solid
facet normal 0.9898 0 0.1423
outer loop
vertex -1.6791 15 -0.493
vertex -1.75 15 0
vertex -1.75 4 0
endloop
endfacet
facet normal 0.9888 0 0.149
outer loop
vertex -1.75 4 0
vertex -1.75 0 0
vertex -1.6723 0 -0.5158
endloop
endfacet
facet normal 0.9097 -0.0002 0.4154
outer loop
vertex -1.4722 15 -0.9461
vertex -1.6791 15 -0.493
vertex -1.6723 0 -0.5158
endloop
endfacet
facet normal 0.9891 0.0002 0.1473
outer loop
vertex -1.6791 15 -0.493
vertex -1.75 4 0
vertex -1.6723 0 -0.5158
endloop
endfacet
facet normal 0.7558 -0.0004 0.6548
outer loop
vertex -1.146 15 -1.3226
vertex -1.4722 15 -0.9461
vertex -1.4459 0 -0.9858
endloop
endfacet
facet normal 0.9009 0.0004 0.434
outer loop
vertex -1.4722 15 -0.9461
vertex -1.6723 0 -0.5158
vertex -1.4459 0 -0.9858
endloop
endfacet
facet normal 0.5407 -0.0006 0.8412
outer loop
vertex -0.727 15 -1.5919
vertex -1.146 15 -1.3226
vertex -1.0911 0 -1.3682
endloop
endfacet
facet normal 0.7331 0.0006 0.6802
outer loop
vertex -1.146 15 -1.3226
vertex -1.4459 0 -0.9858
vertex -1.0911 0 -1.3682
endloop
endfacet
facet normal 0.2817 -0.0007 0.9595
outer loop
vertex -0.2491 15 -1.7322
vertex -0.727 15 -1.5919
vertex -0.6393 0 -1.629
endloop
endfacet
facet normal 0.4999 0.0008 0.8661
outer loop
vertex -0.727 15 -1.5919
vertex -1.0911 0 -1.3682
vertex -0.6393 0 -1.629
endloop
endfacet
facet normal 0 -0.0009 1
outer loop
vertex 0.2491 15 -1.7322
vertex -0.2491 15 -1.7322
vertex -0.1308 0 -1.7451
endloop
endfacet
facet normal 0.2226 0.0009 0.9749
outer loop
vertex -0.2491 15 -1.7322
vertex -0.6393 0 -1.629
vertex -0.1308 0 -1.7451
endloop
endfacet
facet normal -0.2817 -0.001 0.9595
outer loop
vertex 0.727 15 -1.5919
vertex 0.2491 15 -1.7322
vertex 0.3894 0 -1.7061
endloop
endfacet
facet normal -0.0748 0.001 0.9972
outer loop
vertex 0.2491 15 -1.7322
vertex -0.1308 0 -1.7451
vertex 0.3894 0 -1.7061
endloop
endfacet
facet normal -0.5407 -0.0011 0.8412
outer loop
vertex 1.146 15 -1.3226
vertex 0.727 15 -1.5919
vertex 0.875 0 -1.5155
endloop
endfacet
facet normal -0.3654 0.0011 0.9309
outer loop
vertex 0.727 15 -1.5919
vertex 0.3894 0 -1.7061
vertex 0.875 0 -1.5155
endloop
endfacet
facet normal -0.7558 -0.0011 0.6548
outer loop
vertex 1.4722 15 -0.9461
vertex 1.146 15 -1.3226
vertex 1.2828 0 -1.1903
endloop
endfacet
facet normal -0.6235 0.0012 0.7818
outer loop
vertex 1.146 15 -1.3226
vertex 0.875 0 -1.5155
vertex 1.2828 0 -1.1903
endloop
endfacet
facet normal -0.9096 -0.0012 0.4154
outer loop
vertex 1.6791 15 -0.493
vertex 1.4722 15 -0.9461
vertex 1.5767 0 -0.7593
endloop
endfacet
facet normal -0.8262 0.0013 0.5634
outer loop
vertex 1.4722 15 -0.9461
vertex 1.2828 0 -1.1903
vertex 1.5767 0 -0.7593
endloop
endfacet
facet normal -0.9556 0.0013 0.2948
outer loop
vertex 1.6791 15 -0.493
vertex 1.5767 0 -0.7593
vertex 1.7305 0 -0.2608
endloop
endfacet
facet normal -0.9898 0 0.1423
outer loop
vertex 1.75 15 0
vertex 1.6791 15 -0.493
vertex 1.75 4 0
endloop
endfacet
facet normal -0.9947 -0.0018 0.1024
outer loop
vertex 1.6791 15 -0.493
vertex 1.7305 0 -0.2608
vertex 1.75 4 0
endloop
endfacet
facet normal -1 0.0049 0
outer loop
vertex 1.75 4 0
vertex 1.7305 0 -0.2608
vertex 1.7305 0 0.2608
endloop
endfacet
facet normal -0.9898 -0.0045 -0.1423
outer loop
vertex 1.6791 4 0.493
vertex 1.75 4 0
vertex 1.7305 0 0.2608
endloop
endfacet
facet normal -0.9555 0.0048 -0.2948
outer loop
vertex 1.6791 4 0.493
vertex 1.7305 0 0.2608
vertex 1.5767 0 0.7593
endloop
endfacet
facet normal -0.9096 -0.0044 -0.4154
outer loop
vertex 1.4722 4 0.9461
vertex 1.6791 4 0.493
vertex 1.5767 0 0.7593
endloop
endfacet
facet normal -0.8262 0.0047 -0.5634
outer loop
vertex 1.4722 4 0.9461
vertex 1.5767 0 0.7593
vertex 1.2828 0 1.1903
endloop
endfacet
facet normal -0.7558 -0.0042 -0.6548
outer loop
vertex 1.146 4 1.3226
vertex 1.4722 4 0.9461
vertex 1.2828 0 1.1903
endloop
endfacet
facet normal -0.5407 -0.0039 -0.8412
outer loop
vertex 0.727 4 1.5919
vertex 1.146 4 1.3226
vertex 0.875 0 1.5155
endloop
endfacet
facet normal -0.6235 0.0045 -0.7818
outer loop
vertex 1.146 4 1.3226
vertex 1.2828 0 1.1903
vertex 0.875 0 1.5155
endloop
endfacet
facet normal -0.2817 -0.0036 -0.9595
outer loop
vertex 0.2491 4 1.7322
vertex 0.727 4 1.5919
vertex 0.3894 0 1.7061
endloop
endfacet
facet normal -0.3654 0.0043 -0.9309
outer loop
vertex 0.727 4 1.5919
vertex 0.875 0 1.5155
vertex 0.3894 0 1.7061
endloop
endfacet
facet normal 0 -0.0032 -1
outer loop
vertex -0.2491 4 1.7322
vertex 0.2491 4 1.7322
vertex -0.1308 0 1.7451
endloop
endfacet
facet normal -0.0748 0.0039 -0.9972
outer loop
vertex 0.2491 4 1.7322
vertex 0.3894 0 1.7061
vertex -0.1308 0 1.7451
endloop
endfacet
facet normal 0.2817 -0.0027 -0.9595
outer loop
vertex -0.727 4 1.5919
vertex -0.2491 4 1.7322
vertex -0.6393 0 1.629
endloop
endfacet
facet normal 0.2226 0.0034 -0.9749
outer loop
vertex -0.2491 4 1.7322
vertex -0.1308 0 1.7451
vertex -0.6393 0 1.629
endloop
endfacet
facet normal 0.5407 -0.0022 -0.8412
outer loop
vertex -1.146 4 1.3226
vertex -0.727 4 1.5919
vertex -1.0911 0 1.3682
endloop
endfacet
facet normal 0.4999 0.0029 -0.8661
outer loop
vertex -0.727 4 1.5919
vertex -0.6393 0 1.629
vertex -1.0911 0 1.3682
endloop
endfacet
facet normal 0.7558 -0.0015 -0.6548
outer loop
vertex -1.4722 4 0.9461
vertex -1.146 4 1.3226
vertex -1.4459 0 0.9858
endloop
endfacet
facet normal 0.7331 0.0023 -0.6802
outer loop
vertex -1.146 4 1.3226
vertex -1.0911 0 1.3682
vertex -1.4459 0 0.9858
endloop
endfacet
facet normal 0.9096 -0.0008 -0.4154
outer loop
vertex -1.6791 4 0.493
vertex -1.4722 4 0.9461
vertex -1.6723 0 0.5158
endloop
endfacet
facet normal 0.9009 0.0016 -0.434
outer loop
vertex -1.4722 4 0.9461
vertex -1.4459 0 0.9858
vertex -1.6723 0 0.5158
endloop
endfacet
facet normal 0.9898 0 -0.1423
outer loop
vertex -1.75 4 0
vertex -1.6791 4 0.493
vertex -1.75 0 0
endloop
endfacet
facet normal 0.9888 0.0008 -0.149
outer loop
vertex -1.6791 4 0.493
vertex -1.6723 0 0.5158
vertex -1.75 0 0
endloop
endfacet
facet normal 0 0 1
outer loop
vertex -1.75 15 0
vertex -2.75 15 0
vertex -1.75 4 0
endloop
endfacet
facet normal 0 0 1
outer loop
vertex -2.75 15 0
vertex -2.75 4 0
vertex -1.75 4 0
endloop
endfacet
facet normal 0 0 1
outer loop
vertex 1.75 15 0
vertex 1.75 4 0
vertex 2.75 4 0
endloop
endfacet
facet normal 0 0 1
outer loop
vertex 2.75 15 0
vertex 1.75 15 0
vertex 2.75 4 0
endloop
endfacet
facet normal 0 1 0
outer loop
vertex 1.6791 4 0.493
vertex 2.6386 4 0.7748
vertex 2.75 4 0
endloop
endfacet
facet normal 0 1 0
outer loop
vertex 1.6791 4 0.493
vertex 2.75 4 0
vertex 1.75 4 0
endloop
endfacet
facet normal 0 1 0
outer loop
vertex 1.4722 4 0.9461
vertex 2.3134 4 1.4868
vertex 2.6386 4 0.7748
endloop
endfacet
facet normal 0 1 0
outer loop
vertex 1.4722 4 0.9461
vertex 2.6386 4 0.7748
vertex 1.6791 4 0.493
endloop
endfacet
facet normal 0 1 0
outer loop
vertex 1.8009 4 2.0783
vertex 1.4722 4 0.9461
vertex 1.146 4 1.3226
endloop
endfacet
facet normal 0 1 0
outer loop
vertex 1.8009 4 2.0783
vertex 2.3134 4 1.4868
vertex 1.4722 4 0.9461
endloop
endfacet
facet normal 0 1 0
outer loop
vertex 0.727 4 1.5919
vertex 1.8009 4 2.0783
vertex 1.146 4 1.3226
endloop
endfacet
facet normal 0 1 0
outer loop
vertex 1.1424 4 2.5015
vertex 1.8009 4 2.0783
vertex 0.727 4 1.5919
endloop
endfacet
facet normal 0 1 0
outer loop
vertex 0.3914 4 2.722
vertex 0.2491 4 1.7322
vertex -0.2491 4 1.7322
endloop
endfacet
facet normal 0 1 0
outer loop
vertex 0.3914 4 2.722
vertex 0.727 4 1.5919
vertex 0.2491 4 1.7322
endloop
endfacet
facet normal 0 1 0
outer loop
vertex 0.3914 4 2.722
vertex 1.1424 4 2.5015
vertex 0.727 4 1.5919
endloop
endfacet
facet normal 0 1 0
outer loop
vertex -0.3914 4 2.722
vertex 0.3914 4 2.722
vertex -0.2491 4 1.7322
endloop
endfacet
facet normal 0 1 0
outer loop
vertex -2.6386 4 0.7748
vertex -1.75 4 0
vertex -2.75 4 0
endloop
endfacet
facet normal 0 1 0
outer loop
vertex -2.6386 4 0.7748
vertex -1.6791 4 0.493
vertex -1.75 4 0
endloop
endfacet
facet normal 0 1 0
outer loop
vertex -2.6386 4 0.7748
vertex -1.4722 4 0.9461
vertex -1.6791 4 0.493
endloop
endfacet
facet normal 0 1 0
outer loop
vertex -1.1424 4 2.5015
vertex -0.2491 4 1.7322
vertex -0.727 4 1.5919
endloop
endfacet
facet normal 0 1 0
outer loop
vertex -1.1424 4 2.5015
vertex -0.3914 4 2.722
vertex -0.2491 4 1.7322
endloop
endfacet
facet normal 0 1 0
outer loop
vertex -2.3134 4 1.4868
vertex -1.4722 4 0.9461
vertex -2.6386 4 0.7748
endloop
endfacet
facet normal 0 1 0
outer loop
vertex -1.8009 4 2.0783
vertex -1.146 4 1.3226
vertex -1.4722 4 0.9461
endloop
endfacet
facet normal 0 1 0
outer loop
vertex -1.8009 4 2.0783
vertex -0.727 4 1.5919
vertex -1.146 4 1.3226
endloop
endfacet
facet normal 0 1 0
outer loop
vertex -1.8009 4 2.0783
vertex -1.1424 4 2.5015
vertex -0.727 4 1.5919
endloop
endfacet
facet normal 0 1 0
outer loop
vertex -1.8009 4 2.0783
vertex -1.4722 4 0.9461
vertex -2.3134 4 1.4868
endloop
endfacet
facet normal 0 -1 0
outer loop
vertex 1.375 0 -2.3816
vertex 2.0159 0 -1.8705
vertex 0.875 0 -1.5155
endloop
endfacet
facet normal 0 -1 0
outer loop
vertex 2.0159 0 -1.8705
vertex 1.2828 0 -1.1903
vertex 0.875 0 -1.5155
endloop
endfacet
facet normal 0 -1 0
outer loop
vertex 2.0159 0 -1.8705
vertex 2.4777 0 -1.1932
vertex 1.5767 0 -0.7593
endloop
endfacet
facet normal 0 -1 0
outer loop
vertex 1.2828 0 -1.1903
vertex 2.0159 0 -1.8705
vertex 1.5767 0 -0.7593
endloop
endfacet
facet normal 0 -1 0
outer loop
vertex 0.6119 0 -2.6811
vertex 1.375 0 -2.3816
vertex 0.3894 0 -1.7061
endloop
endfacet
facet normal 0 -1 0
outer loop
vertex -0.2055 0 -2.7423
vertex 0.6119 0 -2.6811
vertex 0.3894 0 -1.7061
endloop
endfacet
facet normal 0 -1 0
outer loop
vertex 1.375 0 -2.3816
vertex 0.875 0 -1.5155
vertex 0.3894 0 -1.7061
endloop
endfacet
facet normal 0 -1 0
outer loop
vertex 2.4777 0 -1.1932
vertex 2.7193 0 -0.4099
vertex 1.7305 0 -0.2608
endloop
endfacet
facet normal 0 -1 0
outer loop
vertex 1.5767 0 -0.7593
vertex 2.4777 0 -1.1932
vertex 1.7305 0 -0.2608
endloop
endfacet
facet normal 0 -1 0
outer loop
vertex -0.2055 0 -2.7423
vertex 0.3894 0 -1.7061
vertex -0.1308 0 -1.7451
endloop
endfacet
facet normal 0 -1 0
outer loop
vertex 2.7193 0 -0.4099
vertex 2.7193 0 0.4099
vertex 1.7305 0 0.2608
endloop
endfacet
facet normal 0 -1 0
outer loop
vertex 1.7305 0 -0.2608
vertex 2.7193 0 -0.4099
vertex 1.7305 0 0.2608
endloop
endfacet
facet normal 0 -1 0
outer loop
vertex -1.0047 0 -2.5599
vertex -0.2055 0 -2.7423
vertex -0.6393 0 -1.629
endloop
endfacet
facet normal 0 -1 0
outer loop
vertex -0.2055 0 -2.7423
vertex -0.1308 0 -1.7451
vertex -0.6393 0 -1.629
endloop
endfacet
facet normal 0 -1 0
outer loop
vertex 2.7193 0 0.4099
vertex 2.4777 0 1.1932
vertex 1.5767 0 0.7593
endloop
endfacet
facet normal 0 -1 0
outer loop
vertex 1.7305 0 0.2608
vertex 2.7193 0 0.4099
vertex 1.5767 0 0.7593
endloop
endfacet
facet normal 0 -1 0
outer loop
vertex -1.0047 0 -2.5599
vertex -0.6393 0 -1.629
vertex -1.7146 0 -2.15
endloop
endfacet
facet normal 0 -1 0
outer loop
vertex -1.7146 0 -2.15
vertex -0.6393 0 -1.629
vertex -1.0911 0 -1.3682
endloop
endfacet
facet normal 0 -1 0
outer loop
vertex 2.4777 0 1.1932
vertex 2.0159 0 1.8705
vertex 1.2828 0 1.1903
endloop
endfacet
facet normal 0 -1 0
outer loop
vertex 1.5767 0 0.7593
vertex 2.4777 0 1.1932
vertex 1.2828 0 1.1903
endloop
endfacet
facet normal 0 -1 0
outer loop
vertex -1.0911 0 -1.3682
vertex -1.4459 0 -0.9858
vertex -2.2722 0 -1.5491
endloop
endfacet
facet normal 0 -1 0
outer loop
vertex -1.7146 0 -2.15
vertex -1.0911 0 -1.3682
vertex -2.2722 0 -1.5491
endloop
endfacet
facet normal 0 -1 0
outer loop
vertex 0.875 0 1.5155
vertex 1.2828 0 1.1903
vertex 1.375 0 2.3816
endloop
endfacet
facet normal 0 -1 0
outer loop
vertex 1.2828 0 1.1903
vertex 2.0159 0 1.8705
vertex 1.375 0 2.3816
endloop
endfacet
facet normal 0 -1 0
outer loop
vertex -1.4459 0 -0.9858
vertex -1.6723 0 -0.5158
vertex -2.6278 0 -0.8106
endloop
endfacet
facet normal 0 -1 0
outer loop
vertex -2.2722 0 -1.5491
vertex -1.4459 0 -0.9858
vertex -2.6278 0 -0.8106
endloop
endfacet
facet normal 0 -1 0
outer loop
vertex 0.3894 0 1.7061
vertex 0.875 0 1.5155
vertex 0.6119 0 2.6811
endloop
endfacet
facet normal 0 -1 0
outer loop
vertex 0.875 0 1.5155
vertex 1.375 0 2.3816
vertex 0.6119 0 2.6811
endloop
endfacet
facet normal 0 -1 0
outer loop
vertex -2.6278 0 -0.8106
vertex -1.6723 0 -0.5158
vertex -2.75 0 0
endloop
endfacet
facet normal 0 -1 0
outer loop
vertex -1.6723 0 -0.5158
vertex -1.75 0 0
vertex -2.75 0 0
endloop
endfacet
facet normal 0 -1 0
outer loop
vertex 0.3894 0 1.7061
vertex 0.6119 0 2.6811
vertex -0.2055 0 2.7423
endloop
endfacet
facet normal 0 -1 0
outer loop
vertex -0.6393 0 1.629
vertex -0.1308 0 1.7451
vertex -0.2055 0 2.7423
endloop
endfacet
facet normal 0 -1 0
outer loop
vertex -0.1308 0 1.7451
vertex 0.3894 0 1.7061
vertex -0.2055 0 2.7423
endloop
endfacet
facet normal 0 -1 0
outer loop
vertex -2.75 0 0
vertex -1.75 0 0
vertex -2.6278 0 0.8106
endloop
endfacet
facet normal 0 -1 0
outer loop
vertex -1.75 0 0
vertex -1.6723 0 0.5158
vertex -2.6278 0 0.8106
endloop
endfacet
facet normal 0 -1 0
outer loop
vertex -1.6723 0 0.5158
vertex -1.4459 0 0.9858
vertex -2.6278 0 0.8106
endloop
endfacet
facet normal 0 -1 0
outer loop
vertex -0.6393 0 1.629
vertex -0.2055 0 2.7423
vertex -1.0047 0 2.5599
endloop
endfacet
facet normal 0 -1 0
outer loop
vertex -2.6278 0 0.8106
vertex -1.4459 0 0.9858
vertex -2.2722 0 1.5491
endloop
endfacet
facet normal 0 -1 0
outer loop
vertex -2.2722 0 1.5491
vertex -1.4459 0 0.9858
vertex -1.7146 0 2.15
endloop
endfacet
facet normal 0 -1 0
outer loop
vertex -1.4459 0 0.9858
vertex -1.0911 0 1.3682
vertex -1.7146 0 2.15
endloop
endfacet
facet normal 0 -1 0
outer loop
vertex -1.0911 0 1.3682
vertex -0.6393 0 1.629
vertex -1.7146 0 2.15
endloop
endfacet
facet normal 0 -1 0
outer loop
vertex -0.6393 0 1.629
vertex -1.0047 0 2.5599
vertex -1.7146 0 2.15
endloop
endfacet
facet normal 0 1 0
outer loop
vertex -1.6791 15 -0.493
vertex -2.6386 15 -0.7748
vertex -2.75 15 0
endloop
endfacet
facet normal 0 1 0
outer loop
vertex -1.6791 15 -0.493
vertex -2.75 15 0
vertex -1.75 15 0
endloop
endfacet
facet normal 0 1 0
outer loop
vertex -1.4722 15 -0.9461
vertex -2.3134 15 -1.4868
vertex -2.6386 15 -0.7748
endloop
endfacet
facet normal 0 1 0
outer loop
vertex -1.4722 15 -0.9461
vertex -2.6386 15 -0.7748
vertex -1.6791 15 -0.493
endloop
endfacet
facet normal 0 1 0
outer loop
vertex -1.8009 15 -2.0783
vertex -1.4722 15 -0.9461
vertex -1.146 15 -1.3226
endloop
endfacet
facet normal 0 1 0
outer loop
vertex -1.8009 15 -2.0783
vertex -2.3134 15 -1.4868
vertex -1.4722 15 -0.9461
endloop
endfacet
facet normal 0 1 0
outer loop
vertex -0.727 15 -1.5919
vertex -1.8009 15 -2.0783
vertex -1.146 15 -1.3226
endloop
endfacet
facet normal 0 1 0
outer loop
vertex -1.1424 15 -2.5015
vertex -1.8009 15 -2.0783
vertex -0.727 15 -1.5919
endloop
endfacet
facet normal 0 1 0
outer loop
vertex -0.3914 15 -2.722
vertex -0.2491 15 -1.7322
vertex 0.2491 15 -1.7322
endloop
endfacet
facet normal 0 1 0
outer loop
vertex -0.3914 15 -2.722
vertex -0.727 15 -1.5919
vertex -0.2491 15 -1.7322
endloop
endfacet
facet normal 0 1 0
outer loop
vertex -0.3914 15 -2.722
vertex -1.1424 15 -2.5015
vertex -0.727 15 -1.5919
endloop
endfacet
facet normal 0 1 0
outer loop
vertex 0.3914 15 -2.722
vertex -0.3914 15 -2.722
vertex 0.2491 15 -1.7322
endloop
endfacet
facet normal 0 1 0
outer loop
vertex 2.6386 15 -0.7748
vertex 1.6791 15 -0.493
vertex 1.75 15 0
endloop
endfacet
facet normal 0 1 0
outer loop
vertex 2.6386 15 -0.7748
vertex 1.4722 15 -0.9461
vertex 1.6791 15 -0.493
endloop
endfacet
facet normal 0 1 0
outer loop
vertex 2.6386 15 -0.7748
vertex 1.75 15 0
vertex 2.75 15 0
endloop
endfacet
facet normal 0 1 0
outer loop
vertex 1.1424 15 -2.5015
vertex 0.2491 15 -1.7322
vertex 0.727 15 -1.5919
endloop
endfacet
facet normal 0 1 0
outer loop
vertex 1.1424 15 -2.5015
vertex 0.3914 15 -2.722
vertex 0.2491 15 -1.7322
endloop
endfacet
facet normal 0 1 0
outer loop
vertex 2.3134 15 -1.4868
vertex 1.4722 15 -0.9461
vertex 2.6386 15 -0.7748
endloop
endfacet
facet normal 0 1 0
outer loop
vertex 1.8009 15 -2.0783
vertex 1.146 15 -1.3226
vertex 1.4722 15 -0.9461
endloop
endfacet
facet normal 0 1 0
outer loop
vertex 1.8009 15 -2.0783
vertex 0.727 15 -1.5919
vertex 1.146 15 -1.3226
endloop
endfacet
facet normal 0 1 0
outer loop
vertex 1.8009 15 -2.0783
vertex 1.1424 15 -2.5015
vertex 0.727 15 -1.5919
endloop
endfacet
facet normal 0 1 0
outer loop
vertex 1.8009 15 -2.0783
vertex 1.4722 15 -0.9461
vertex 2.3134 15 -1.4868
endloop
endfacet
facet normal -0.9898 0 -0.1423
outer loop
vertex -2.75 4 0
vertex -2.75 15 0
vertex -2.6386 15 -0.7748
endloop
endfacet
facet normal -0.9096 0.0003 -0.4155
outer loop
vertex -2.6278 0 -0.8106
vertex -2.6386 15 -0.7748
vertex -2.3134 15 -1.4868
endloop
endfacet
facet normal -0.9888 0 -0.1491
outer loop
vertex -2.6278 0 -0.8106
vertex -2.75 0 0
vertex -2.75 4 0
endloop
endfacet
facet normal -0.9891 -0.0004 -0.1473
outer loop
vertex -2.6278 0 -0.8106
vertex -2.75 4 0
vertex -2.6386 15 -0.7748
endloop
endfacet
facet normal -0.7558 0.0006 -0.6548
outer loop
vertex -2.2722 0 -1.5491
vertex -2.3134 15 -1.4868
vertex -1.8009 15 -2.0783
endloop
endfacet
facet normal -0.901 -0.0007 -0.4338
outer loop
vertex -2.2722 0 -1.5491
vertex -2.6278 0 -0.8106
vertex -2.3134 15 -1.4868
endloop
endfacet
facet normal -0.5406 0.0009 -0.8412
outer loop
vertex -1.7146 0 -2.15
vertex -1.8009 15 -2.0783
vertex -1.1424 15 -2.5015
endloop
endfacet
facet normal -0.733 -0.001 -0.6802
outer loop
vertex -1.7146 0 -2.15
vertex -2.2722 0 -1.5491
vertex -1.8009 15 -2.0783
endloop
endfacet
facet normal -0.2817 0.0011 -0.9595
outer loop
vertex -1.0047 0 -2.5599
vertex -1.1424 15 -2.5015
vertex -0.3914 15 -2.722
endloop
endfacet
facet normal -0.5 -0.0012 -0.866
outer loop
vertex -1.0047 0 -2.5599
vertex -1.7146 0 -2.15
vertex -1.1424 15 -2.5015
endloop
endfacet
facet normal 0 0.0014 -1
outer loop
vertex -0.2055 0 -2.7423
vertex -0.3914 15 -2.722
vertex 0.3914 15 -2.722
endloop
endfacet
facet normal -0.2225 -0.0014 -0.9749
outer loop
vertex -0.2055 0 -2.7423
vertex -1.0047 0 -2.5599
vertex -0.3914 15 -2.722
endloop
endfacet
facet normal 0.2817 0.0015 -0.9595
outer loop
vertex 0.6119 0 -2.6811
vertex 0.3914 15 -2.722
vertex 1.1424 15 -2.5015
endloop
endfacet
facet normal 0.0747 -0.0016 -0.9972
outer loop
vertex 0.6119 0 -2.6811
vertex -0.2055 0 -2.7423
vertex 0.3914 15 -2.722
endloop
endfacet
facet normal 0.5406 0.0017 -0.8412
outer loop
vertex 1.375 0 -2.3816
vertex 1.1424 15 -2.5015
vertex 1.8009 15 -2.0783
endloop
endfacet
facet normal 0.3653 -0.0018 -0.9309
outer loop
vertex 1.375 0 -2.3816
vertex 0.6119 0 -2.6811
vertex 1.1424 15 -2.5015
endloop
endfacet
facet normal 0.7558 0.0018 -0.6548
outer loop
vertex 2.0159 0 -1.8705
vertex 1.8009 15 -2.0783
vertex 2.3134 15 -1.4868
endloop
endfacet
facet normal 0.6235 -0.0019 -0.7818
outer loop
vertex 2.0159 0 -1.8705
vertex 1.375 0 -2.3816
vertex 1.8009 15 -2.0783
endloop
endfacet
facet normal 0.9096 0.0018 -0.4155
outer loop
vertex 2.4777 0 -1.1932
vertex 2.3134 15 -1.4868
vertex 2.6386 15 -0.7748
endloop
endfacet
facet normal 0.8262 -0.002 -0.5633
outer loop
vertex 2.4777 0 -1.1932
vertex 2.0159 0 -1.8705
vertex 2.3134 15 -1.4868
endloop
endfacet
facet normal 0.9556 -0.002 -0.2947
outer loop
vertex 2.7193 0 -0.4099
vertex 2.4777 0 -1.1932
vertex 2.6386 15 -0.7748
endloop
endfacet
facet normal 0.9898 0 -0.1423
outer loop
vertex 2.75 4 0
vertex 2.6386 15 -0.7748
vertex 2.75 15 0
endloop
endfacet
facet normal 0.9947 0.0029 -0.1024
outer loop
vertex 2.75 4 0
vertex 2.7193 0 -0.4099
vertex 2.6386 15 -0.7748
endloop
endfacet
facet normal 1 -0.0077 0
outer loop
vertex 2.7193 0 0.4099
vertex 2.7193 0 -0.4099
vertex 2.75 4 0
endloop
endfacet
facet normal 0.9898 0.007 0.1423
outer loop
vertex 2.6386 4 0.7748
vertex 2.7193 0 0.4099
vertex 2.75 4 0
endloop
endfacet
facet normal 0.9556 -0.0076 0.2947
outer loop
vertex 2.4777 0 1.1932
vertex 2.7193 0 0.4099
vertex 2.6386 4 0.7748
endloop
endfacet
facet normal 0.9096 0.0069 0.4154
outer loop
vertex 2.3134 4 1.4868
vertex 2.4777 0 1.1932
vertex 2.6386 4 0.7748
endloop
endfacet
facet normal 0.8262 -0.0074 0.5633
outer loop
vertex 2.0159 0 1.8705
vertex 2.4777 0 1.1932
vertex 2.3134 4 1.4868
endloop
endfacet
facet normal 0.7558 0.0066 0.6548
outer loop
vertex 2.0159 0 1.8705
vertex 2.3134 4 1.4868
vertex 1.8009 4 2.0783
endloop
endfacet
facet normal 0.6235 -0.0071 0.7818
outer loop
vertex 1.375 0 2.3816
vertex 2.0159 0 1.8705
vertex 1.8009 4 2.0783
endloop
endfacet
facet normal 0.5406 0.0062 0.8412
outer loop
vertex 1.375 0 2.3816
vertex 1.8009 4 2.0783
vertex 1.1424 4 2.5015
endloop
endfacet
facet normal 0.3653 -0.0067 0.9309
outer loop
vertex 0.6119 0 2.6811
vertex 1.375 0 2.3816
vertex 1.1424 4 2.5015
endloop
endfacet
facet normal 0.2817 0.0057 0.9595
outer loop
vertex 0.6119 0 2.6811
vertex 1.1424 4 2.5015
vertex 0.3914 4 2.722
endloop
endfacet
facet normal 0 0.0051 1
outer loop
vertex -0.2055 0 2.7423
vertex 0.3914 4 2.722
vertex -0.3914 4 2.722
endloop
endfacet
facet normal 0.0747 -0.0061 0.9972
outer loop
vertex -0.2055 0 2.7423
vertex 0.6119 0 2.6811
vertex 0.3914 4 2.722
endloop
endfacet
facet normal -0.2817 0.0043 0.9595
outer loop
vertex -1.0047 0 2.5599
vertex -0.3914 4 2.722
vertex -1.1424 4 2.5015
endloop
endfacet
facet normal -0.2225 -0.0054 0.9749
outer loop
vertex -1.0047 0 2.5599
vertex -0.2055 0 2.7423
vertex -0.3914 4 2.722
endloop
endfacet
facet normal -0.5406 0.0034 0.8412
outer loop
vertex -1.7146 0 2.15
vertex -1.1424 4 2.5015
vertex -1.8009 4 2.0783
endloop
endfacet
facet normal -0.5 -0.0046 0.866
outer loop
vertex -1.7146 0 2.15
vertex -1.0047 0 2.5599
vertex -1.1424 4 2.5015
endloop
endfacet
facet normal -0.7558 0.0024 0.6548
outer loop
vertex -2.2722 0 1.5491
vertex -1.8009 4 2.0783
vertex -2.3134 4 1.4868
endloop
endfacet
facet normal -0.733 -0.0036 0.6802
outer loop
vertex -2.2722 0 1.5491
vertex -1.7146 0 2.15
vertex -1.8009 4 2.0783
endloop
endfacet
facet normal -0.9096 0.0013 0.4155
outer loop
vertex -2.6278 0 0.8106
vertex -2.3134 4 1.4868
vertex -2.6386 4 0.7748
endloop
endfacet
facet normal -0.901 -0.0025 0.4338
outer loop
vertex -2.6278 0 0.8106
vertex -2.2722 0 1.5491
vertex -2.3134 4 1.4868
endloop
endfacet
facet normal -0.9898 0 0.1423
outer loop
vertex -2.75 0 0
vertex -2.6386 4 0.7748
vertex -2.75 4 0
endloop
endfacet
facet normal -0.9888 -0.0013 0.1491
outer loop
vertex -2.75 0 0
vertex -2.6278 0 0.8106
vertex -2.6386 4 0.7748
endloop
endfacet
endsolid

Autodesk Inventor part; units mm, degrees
ref_plane "YZ Plane" through (0, 0, 0) normal (1, 0, 0) x (0, 1, 0)
ref_plane "XZ Plane" through (0, 0, 0) normal (0, 1, 0) x (-1, 0, 0)
ref_plane "XY Plane" through (0, 0, 0) normal (0, 0, 1) x (1, 0, 0)
sketch "Sketch1" plane through (0, 0, 0) normal (0, 1, 0) x (-1, 0, 0)
  circle A0 centre (0, 0) radius 1.75
  circle A1 centre (0, 0) radius 2.75
  dimension "d0" = 3.5
  dimension "d1" = 5.5
extrude "Extrusion1" add sketch "Sketch1" along normal blind 4
sketch "Sketch2" plane through (0, 4, 0) normal (0, 1, 0) x (1, 0, 0)
  circle A0 centre (0, 0) radius 1.75 projected
  circle A1 centre (0, 0) radius 2.75 projected
  circle A2 centre (0, 0) radius 2.75
  circle A3 centre (0, 0) radius 1.75
  circle A4 centre (0, 0) radius 2.75 projected
  circle A5 centre (0, 0) radius 1.75 projected
  circle A6 centre (0, 0) radius 2.75 projected
  line L0 (-2.75, 0) -> (0, 0)
  line L1 (0, 0) -> (2.75, 0)
  arc A7 (1.75, 0) -> (-1.75, 0) centre (0, 0) ccw
  arc A8 (2.75, 0) -> (-2.75, 0) centre (0, 0) ccw
extrude "Extrusion2" add sketch "Sketch2" along normal blind 11 contours A0 L0 A1 L1 picked at (-2.3731, 0.359)
properties part number "espaciador2"
